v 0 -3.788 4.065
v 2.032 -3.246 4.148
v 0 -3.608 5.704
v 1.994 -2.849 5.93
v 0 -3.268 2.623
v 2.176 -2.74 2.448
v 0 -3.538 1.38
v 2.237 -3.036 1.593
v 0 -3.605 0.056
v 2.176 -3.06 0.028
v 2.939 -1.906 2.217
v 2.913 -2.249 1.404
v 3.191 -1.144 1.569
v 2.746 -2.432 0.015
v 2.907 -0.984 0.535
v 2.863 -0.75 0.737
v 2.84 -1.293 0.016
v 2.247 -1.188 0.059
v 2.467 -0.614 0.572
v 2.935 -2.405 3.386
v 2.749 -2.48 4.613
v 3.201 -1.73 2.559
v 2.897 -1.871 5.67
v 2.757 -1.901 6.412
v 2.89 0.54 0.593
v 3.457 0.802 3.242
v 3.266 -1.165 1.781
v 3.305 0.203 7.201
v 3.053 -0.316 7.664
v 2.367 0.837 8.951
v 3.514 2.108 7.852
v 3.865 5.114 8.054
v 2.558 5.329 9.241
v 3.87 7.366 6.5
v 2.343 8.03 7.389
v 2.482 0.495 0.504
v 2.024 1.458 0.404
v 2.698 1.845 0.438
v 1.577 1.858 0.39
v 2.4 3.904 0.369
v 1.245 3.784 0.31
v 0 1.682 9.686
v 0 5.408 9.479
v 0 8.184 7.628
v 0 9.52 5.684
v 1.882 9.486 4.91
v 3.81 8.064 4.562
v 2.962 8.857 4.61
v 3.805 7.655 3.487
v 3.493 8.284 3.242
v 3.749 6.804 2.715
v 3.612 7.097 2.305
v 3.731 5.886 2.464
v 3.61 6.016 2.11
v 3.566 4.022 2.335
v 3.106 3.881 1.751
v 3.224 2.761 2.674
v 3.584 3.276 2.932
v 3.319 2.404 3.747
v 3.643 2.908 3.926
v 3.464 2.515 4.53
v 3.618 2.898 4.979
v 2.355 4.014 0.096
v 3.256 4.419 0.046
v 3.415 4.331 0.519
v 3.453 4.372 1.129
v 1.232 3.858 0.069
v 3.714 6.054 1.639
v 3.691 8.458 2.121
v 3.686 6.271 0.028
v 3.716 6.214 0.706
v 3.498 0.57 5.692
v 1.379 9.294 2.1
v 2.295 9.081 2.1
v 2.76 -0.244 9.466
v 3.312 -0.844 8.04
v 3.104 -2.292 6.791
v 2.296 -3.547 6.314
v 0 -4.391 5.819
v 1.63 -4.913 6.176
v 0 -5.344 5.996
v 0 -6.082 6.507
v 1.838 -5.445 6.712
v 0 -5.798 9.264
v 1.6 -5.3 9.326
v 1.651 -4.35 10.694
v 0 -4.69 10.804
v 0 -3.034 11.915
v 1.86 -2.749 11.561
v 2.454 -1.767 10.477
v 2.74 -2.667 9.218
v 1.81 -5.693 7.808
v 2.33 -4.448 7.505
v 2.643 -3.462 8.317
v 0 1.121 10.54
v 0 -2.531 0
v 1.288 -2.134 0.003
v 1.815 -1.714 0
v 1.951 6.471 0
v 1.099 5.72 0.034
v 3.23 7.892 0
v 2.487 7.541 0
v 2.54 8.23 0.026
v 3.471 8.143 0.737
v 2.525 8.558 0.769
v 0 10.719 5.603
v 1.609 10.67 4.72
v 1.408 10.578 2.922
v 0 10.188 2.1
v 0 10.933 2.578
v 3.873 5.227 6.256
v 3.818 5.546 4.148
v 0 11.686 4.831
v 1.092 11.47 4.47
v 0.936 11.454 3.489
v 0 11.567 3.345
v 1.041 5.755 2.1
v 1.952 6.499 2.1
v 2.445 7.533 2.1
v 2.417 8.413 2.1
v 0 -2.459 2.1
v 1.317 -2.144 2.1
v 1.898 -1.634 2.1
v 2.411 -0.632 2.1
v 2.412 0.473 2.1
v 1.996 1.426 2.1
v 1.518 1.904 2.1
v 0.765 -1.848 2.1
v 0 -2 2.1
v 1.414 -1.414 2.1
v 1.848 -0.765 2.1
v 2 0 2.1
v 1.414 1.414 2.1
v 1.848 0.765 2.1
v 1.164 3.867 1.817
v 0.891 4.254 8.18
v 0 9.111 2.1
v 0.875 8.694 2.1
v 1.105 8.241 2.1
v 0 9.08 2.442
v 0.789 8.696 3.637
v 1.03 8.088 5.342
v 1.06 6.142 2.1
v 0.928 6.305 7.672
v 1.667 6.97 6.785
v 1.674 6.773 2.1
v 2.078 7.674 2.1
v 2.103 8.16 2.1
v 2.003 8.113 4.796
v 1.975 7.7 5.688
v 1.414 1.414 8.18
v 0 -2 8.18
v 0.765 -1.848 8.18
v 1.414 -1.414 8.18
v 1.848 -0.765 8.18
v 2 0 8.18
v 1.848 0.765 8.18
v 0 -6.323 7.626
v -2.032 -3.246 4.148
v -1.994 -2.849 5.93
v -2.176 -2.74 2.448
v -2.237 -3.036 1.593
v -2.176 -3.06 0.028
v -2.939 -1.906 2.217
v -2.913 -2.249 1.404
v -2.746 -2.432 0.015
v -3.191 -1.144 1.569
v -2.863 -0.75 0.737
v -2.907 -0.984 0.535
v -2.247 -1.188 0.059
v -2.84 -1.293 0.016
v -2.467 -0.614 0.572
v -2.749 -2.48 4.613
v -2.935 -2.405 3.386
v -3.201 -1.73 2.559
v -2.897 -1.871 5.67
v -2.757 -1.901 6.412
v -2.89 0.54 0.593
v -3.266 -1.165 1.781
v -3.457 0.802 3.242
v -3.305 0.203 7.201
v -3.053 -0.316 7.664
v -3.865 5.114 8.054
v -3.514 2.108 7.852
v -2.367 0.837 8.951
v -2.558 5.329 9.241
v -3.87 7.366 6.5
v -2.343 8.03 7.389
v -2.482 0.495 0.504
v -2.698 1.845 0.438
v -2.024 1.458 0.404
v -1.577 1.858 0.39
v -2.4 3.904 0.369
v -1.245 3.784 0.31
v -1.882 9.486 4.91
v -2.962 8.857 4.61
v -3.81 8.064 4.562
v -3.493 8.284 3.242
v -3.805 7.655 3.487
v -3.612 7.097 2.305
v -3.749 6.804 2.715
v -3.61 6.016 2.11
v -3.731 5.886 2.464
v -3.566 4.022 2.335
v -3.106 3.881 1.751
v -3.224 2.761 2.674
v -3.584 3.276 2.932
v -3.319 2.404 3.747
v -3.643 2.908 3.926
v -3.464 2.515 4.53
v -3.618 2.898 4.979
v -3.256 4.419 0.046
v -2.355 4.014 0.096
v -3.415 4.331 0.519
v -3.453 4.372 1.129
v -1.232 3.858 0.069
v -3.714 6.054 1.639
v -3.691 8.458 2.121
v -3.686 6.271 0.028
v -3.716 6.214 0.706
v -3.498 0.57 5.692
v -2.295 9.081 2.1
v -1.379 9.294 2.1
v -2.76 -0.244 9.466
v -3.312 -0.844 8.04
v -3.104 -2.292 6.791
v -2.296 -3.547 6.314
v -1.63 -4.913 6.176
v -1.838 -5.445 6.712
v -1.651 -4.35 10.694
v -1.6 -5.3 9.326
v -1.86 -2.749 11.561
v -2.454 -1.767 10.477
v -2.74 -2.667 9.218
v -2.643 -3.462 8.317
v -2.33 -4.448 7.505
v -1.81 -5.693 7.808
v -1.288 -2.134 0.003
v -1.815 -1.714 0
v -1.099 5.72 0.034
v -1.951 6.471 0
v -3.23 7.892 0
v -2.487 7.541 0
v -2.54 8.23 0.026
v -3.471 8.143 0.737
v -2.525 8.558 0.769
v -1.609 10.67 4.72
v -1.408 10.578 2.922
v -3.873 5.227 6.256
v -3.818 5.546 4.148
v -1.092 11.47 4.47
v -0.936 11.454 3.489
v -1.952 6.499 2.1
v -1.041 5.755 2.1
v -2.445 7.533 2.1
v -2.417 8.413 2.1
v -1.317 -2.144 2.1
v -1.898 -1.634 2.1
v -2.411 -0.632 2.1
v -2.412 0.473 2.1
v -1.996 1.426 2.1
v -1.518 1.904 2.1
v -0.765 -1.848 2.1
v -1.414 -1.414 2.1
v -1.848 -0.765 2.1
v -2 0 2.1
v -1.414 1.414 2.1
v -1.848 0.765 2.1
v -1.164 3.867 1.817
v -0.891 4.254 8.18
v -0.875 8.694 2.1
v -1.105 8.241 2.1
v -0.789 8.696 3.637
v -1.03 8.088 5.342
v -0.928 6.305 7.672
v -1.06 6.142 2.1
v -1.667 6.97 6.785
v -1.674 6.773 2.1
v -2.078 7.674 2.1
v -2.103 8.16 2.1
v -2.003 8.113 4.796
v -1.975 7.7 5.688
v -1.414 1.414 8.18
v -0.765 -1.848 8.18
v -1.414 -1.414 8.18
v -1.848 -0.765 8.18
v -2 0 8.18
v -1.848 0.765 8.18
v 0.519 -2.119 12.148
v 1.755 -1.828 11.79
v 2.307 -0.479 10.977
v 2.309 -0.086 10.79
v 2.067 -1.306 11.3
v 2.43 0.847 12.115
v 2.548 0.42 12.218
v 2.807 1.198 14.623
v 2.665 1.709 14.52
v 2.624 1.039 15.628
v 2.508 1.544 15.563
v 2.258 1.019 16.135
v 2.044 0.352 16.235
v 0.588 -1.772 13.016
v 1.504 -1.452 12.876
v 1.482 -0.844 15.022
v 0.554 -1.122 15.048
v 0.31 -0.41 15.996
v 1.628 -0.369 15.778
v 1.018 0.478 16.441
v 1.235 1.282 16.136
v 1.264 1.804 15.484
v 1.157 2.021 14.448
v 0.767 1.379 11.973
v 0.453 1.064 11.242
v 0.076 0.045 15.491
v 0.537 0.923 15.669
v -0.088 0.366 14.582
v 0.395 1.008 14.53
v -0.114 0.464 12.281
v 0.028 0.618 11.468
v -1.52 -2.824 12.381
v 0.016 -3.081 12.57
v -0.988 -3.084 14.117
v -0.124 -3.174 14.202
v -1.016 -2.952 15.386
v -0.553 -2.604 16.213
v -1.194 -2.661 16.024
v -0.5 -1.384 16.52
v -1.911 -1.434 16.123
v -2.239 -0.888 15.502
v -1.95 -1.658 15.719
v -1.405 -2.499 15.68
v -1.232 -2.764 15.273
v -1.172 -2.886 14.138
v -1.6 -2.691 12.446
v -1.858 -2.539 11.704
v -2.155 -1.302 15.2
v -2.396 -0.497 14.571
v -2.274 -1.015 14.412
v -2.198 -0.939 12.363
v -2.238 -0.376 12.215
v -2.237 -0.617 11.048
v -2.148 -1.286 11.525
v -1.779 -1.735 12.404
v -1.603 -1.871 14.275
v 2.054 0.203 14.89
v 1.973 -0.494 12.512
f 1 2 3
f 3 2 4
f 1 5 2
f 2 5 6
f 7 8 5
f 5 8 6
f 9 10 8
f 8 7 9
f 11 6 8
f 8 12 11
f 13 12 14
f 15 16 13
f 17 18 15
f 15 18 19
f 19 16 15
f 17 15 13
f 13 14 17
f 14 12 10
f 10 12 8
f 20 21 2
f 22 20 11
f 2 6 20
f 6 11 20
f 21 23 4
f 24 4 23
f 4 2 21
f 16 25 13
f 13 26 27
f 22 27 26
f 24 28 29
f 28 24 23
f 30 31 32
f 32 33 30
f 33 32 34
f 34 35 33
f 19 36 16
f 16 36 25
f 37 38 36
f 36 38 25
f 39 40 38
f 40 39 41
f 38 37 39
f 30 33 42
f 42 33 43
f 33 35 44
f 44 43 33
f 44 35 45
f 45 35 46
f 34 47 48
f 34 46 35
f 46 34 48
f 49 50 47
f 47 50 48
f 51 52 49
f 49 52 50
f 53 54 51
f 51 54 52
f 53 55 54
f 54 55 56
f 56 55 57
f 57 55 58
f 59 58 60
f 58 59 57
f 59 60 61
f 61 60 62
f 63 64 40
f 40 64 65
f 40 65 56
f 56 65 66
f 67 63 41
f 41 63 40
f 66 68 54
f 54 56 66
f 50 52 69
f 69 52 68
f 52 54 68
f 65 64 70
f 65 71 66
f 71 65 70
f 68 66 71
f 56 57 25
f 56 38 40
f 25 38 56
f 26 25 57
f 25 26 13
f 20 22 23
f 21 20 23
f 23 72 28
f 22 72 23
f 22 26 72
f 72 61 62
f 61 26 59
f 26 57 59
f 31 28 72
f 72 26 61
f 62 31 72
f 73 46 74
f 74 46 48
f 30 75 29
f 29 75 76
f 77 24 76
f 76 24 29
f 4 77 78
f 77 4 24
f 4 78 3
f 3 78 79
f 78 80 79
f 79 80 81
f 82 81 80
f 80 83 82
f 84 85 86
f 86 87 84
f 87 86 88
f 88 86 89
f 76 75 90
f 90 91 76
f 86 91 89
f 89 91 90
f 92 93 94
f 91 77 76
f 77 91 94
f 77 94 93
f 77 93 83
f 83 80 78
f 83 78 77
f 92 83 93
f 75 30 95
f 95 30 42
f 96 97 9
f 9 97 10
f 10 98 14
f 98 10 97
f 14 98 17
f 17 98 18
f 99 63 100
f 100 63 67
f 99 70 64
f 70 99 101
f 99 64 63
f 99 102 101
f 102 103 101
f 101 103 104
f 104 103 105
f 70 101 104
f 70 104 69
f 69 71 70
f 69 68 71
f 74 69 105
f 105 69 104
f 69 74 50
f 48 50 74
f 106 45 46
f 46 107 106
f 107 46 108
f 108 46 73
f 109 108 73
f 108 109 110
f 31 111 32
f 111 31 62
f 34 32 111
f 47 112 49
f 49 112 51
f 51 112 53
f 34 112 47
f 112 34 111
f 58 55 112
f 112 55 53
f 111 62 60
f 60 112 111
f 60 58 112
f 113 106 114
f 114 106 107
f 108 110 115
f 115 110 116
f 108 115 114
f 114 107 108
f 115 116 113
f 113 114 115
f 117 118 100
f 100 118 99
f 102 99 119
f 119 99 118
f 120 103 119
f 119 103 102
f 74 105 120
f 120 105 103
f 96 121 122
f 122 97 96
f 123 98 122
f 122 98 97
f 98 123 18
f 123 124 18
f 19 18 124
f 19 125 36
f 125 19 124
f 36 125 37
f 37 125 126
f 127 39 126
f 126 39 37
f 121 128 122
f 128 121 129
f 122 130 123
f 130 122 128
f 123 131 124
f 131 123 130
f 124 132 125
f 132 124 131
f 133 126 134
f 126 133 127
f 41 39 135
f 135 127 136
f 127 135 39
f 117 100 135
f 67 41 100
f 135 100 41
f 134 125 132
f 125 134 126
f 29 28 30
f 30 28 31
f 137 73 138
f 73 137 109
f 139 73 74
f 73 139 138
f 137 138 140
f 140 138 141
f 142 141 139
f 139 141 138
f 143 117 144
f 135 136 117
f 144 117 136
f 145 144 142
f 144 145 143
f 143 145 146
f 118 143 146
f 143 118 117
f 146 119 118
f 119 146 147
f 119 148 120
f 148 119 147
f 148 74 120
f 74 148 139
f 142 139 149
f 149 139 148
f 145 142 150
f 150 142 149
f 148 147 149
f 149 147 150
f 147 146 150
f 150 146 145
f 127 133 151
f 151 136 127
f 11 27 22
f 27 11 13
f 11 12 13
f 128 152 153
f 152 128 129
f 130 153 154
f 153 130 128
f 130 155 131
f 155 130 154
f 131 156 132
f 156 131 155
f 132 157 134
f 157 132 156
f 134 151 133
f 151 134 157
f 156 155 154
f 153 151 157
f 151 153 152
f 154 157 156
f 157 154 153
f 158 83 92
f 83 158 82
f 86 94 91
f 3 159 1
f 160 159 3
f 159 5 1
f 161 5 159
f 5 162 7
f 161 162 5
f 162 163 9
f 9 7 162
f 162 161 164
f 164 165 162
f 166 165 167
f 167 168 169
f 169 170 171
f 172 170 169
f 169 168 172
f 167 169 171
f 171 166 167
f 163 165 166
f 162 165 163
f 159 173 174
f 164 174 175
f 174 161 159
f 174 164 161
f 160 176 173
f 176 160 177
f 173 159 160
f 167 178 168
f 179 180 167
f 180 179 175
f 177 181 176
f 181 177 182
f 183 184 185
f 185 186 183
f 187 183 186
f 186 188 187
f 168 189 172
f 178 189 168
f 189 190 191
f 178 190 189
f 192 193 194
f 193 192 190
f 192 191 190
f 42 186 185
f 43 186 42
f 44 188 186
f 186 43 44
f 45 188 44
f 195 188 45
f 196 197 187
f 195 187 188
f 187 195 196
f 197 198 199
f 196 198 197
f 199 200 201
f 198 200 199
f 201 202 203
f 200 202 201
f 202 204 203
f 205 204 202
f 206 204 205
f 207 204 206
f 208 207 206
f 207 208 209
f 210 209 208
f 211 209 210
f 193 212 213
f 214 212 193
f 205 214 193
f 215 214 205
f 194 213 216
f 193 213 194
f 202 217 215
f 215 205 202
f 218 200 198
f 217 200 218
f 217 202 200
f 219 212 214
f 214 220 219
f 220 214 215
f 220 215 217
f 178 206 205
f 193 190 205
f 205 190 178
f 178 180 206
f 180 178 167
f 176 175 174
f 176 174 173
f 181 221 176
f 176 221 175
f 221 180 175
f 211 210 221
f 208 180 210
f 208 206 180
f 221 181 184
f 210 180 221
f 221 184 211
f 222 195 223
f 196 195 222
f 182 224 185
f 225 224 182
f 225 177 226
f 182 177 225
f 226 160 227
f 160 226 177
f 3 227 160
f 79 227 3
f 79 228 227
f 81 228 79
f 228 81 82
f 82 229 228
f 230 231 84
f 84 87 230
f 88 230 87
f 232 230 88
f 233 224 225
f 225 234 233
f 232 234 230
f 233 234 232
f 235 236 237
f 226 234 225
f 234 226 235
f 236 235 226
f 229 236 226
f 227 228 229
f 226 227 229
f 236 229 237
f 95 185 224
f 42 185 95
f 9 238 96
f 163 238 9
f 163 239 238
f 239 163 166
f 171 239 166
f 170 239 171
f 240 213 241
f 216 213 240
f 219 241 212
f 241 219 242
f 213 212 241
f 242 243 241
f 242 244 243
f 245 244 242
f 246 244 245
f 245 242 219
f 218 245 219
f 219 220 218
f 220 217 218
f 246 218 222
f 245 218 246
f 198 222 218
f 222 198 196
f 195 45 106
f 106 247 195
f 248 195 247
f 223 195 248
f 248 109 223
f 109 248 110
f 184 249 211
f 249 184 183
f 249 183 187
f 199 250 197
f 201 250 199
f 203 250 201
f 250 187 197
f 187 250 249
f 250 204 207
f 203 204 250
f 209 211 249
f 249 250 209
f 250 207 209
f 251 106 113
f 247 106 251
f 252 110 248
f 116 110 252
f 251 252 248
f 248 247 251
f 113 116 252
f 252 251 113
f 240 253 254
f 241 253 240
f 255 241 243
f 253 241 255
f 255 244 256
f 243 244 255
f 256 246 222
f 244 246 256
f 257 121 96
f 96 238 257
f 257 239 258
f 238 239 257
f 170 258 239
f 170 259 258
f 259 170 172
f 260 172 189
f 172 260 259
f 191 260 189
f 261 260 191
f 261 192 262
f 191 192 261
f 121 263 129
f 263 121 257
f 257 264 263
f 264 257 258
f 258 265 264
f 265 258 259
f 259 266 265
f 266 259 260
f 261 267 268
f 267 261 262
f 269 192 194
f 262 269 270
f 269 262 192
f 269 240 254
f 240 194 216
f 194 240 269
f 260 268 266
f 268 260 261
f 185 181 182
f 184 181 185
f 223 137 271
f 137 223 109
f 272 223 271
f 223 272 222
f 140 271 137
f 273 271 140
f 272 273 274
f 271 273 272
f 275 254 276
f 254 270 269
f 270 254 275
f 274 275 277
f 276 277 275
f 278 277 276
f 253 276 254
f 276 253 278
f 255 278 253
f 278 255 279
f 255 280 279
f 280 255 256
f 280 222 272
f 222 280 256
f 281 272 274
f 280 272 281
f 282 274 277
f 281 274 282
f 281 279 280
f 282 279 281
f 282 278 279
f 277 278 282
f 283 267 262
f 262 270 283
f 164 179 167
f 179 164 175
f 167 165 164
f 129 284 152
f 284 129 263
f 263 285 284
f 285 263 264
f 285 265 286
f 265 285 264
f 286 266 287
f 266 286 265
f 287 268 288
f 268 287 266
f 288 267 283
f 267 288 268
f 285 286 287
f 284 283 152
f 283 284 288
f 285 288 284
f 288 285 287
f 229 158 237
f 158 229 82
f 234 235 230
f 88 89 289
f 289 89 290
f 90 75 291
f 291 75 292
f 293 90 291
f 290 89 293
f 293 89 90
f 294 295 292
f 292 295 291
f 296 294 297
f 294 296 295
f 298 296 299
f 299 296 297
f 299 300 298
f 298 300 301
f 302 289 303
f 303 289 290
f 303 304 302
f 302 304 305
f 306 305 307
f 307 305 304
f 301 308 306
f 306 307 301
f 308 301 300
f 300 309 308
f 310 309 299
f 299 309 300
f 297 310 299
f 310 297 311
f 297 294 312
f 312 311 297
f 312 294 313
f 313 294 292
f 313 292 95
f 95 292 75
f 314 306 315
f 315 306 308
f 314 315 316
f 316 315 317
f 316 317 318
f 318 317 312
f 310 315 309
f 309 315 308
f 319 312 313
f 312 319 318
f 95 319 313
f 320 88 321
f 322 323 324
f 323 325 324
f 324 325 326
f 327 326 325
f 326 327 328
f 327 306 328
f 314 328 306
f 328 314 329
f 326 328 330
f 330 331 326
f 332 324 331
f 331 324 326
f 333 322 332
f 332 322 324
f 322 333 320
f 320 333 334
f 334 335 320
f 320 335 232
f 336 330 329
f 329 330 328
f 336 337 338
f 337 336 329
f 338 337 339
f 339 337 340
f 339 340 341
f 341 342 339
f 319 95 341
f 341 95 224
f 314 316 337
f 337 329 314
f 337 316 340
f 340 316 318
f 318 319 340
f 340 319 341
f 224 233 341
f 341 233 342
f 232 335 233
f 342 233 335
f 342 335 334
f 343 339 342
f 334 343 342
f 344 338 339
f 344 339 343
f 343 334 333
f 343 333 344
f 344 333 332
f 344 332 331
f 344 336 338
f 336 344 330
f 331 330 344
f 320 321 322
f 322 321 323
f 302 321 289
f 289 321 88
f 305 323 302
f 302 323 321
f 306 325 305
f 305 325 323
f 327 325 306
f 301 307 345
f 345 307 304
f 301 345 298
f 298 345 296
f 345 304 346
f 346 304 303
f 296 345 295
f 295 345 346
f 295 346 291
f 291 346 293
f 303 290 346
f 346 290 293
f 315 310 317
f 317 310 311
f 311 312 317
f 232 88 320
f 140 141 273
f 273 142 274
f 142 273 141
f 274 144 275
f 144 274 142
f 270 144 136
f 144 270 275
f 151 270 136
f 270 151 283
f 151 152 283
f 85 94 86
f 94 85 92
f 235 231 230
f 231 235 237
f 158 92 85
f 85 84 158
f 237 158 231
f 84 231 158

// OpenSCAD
use <../lib.scad>
use <s/29685s01.scad>
use <s/29685s02.scad>
$fa=1; $fs=0.2;
function ldraw_lib__29685(realsolid=false) = [
// 0 Animal Bunny
// 0 Name: 29685.dat
// 0 Author: Philippe Hurbain [Philo]
// 0 !LDRAW_ORG Part UPDATE 2019-01
// 0 !LICENSE Licensed under CC BY 2.0 and CC BY 4.0 : see CAreadme.txt
// 
// 0 BFC CERTIFY CCW
  [0,"BFC","CERTIFY"],
  [0,"BFC","CCW"],
// 
// 0 !KEYWORDS Rabbit
// 
// 0 !HISTORY 2018-01-28 {LEGO Digital Designer} Original part shape
// 0 !HISTORY 2019-05-20 [Philo] File preparation for LDraw Parts Tracker
// 0 !HISTORY 2019-06-28 [PTadmin] Official Update 2019-01
// 
// 
// 1 16 0 0 0 1 0 0 0 1 0 0 0 1 s\29685s01.dat
  [1,16,0,0,0,1,0,0,0,1,0,0,0,1, ldraw_lib__s__29685s01(realsolid)],
// 1 16 0 0 0 -1 0 0 0 1 0 0 0 1 s\29685s01.dat
  [1,16,0,0,0,-1,0,0,0,1,0,0,0,1, ldraw_lib__s__29685s01(realsolid)],
// 1 16 0 0 0 1 0 0 0 1 0 0 0 1 s\29685s02.dat
  [1,16,0,0,0,1,0,0,0,1,0,0,0,1, ldraw_lib__s__29685s02(realsolid)],
// 3 16 0 -6.106 22.699 1.973 -9.093 21.741 -1.973 -9.093 21.741
  [3,16,0,-6.106,22.699,1.973,-9.093,21.741,-1.973,-9.093,21.741],
// 4 16 -2.575 -13.355 20.219 -1.973 -9.093 21.741 1.973 -9.093 21.741 2.575 -13.355 20.219
  [4,16,-2.575,-13.355,20.219,-1.973,-9.093,21.741,1.973,-9.093,21.741,2.575,-13.355,20.219],
// 4 16 -2.32 -19.179 15.762 -2.575 -13.355 20.219 2.575 -13.355 20.219 2.32 -19.179 15.762
  [4,16,-2.32,-19.179,15.762,-2.575,-13.355,20.219,2.575,-13.355,20.219,2.32,-19.179,15.762],
// 4 16 -2.32 -19.179 15.762 2.32 -19.179 15.762 2.227 -20.45 10.634 -2.227 -20.45 10.634
  [4,16,-2.32,-19.179,15.762,2.32,-19.179,15.762,2.227,-20.45,10.634,-2.227,-20.45,10.634],
// 4 16 3.5355 -20.45 3.5355 -3.5355 -20.45 3.5355 -2.227 -20.45 10.634 2.227 -20.45 10.634
  [4,16,3.5355,-20.45,3.5355,-3.5355,-20.45,3.5355,-2.227,-20.45,10.634,2.227,-20.45,10.634],
// 3 16 3.5355 -20.45 3.5355 0 -20.45 -5 -3.5355 -20.45 3.5355
  [3,16,3.5355,-20.45,3.5355,0,-20.45,-5,-3.5355,-20.45,3.5355],
// 
// 0 // Eyes
// 3 16 3.999 -23.316 -13.25 6.607 -20.792 -8.655 4.127 -26.736 -10.874
  [3,16,3.999,-23.316,-13.25,6.607,-20.792,-8.655,4.127,-26.736,-10.874],
// 3 16 6.607 -20.792 -8.655 3.999 -23.316 -13.25 4.525 -19.519 -14.232
  [3,16,6.607,-20.792,-8.655,3.999,-23.316,-13.25,4.525,-19.519,-14.232],
// 5 24 3.999 -23.316 -13.25 6.607 -20.792 -8.655 4.127 -26.736 -10.874 4.525 -19.519 -14.232
  [5,24,3.999,-23.316,-13.25,6.607,-20.792,-8.655,4.127,-26.736,-10.874,4.525,-19.519,-14.232],
// 
// 3 16 -6.607 -20.792 -8.655 -3.999 -23.316 -13.25 -4.127 -26.736 -10.874
  [3,16,-6.607,-20.792,-8.655,-3.999,-23.316,-13.25,-4.127,-26.736,-10.874],
// 3 16 -3.999 -23.316 -13.25 -6.607 -20.792 -8.655 -4.525 -19.519 -14.232
  [3,16,-3.999,-23.316,-13.25,-6.607,-20.792,-8.655,-4.525,-19.519,-14.232],
// 5 24 -3.999 -23.316 -13.25 -6.607 -20.792 -8.655 -4.127 -26.736 -10.874 -4.525 -19.519 -14.232
  [5,24,-3.999,-23.316,-13.25,-6.607,-20.792,-8.655,-4.127,-26.736,-10.874,-4.525,-19.519,-14.232],
// 
// 0 // Nose
// 3 16 0 -19.064 -15.808 4.525 -19.519 -14.232 3.999 -23.316 -13.25
  [3,16,0,-19.064,-15.808,4.525,-19.519,-14.232,3.999,-23.316,-13.25],
// 3 16 3.999 -23.316 -13.25 0 -23.16 -14.495 0 -19.064 -15.808
  [3,16,3.999,-23.316,-13.25,0,-23.16,-14.495,0,-19.064,-15.808],
// 3 16 -4.525 -19.519 -14.232 0 -19.064 -15.808 -3.999 -23.316 -13.25
  [3,16,-4.525,-19.519,-14.232,0,-19.064,-15.808,-3.999,-23.316,-13.25],
// 3 16 0 -23.16 -14.495 -3.999 -23.316 -13.25 0 -19.064 -15.808
  [3,16,0,-23.16,-14.495,-3.999,-23.316,-13.25,0,-19.064,-15.808],
// 5 24 3.999 -23.316 -13.25 0 -19.064 -15.808 4.525 -19.519 -14.232 0 -23.16 -14.495
  [5,24,3.999,-23.316,-13.25,0,-19.064,-15.808,4.525,-19.519,-14.232,0,-23.16,-14.495],
// 5 24 0 -23.16 -14.495 0 -19.064 -15.808 3.999 -23.316 -13.25 -3.999 -23.316 -13.25
  [5,24,0,-23.16,-14.495,0,-19.064,-15.808,3.999,-23.316,-13.25,-3.999,-23.316,-13.25],
// 5 24 0 -19.064 -15.808 -3.999 -23.316 -13.25 -4.525 -19.519 -14.232 0 -23.16 -14.495
  [5,24,0,-19.064,-15.808,-3.999,-23.316,-13.25,-4.525,-19.519,-14.232,0,-23.16,-14.495],
];
module ldraw_lib__29685(step=0, col=false, unit=2/5, alt=false, line=0.2, solid=!$preview)
    makepoly(ldraw_lib__29685(solid), step=step, col=col, unit=unit, alt=alt, line=line, solid=solid);
ldraw_lib__29685(line=0.2);
